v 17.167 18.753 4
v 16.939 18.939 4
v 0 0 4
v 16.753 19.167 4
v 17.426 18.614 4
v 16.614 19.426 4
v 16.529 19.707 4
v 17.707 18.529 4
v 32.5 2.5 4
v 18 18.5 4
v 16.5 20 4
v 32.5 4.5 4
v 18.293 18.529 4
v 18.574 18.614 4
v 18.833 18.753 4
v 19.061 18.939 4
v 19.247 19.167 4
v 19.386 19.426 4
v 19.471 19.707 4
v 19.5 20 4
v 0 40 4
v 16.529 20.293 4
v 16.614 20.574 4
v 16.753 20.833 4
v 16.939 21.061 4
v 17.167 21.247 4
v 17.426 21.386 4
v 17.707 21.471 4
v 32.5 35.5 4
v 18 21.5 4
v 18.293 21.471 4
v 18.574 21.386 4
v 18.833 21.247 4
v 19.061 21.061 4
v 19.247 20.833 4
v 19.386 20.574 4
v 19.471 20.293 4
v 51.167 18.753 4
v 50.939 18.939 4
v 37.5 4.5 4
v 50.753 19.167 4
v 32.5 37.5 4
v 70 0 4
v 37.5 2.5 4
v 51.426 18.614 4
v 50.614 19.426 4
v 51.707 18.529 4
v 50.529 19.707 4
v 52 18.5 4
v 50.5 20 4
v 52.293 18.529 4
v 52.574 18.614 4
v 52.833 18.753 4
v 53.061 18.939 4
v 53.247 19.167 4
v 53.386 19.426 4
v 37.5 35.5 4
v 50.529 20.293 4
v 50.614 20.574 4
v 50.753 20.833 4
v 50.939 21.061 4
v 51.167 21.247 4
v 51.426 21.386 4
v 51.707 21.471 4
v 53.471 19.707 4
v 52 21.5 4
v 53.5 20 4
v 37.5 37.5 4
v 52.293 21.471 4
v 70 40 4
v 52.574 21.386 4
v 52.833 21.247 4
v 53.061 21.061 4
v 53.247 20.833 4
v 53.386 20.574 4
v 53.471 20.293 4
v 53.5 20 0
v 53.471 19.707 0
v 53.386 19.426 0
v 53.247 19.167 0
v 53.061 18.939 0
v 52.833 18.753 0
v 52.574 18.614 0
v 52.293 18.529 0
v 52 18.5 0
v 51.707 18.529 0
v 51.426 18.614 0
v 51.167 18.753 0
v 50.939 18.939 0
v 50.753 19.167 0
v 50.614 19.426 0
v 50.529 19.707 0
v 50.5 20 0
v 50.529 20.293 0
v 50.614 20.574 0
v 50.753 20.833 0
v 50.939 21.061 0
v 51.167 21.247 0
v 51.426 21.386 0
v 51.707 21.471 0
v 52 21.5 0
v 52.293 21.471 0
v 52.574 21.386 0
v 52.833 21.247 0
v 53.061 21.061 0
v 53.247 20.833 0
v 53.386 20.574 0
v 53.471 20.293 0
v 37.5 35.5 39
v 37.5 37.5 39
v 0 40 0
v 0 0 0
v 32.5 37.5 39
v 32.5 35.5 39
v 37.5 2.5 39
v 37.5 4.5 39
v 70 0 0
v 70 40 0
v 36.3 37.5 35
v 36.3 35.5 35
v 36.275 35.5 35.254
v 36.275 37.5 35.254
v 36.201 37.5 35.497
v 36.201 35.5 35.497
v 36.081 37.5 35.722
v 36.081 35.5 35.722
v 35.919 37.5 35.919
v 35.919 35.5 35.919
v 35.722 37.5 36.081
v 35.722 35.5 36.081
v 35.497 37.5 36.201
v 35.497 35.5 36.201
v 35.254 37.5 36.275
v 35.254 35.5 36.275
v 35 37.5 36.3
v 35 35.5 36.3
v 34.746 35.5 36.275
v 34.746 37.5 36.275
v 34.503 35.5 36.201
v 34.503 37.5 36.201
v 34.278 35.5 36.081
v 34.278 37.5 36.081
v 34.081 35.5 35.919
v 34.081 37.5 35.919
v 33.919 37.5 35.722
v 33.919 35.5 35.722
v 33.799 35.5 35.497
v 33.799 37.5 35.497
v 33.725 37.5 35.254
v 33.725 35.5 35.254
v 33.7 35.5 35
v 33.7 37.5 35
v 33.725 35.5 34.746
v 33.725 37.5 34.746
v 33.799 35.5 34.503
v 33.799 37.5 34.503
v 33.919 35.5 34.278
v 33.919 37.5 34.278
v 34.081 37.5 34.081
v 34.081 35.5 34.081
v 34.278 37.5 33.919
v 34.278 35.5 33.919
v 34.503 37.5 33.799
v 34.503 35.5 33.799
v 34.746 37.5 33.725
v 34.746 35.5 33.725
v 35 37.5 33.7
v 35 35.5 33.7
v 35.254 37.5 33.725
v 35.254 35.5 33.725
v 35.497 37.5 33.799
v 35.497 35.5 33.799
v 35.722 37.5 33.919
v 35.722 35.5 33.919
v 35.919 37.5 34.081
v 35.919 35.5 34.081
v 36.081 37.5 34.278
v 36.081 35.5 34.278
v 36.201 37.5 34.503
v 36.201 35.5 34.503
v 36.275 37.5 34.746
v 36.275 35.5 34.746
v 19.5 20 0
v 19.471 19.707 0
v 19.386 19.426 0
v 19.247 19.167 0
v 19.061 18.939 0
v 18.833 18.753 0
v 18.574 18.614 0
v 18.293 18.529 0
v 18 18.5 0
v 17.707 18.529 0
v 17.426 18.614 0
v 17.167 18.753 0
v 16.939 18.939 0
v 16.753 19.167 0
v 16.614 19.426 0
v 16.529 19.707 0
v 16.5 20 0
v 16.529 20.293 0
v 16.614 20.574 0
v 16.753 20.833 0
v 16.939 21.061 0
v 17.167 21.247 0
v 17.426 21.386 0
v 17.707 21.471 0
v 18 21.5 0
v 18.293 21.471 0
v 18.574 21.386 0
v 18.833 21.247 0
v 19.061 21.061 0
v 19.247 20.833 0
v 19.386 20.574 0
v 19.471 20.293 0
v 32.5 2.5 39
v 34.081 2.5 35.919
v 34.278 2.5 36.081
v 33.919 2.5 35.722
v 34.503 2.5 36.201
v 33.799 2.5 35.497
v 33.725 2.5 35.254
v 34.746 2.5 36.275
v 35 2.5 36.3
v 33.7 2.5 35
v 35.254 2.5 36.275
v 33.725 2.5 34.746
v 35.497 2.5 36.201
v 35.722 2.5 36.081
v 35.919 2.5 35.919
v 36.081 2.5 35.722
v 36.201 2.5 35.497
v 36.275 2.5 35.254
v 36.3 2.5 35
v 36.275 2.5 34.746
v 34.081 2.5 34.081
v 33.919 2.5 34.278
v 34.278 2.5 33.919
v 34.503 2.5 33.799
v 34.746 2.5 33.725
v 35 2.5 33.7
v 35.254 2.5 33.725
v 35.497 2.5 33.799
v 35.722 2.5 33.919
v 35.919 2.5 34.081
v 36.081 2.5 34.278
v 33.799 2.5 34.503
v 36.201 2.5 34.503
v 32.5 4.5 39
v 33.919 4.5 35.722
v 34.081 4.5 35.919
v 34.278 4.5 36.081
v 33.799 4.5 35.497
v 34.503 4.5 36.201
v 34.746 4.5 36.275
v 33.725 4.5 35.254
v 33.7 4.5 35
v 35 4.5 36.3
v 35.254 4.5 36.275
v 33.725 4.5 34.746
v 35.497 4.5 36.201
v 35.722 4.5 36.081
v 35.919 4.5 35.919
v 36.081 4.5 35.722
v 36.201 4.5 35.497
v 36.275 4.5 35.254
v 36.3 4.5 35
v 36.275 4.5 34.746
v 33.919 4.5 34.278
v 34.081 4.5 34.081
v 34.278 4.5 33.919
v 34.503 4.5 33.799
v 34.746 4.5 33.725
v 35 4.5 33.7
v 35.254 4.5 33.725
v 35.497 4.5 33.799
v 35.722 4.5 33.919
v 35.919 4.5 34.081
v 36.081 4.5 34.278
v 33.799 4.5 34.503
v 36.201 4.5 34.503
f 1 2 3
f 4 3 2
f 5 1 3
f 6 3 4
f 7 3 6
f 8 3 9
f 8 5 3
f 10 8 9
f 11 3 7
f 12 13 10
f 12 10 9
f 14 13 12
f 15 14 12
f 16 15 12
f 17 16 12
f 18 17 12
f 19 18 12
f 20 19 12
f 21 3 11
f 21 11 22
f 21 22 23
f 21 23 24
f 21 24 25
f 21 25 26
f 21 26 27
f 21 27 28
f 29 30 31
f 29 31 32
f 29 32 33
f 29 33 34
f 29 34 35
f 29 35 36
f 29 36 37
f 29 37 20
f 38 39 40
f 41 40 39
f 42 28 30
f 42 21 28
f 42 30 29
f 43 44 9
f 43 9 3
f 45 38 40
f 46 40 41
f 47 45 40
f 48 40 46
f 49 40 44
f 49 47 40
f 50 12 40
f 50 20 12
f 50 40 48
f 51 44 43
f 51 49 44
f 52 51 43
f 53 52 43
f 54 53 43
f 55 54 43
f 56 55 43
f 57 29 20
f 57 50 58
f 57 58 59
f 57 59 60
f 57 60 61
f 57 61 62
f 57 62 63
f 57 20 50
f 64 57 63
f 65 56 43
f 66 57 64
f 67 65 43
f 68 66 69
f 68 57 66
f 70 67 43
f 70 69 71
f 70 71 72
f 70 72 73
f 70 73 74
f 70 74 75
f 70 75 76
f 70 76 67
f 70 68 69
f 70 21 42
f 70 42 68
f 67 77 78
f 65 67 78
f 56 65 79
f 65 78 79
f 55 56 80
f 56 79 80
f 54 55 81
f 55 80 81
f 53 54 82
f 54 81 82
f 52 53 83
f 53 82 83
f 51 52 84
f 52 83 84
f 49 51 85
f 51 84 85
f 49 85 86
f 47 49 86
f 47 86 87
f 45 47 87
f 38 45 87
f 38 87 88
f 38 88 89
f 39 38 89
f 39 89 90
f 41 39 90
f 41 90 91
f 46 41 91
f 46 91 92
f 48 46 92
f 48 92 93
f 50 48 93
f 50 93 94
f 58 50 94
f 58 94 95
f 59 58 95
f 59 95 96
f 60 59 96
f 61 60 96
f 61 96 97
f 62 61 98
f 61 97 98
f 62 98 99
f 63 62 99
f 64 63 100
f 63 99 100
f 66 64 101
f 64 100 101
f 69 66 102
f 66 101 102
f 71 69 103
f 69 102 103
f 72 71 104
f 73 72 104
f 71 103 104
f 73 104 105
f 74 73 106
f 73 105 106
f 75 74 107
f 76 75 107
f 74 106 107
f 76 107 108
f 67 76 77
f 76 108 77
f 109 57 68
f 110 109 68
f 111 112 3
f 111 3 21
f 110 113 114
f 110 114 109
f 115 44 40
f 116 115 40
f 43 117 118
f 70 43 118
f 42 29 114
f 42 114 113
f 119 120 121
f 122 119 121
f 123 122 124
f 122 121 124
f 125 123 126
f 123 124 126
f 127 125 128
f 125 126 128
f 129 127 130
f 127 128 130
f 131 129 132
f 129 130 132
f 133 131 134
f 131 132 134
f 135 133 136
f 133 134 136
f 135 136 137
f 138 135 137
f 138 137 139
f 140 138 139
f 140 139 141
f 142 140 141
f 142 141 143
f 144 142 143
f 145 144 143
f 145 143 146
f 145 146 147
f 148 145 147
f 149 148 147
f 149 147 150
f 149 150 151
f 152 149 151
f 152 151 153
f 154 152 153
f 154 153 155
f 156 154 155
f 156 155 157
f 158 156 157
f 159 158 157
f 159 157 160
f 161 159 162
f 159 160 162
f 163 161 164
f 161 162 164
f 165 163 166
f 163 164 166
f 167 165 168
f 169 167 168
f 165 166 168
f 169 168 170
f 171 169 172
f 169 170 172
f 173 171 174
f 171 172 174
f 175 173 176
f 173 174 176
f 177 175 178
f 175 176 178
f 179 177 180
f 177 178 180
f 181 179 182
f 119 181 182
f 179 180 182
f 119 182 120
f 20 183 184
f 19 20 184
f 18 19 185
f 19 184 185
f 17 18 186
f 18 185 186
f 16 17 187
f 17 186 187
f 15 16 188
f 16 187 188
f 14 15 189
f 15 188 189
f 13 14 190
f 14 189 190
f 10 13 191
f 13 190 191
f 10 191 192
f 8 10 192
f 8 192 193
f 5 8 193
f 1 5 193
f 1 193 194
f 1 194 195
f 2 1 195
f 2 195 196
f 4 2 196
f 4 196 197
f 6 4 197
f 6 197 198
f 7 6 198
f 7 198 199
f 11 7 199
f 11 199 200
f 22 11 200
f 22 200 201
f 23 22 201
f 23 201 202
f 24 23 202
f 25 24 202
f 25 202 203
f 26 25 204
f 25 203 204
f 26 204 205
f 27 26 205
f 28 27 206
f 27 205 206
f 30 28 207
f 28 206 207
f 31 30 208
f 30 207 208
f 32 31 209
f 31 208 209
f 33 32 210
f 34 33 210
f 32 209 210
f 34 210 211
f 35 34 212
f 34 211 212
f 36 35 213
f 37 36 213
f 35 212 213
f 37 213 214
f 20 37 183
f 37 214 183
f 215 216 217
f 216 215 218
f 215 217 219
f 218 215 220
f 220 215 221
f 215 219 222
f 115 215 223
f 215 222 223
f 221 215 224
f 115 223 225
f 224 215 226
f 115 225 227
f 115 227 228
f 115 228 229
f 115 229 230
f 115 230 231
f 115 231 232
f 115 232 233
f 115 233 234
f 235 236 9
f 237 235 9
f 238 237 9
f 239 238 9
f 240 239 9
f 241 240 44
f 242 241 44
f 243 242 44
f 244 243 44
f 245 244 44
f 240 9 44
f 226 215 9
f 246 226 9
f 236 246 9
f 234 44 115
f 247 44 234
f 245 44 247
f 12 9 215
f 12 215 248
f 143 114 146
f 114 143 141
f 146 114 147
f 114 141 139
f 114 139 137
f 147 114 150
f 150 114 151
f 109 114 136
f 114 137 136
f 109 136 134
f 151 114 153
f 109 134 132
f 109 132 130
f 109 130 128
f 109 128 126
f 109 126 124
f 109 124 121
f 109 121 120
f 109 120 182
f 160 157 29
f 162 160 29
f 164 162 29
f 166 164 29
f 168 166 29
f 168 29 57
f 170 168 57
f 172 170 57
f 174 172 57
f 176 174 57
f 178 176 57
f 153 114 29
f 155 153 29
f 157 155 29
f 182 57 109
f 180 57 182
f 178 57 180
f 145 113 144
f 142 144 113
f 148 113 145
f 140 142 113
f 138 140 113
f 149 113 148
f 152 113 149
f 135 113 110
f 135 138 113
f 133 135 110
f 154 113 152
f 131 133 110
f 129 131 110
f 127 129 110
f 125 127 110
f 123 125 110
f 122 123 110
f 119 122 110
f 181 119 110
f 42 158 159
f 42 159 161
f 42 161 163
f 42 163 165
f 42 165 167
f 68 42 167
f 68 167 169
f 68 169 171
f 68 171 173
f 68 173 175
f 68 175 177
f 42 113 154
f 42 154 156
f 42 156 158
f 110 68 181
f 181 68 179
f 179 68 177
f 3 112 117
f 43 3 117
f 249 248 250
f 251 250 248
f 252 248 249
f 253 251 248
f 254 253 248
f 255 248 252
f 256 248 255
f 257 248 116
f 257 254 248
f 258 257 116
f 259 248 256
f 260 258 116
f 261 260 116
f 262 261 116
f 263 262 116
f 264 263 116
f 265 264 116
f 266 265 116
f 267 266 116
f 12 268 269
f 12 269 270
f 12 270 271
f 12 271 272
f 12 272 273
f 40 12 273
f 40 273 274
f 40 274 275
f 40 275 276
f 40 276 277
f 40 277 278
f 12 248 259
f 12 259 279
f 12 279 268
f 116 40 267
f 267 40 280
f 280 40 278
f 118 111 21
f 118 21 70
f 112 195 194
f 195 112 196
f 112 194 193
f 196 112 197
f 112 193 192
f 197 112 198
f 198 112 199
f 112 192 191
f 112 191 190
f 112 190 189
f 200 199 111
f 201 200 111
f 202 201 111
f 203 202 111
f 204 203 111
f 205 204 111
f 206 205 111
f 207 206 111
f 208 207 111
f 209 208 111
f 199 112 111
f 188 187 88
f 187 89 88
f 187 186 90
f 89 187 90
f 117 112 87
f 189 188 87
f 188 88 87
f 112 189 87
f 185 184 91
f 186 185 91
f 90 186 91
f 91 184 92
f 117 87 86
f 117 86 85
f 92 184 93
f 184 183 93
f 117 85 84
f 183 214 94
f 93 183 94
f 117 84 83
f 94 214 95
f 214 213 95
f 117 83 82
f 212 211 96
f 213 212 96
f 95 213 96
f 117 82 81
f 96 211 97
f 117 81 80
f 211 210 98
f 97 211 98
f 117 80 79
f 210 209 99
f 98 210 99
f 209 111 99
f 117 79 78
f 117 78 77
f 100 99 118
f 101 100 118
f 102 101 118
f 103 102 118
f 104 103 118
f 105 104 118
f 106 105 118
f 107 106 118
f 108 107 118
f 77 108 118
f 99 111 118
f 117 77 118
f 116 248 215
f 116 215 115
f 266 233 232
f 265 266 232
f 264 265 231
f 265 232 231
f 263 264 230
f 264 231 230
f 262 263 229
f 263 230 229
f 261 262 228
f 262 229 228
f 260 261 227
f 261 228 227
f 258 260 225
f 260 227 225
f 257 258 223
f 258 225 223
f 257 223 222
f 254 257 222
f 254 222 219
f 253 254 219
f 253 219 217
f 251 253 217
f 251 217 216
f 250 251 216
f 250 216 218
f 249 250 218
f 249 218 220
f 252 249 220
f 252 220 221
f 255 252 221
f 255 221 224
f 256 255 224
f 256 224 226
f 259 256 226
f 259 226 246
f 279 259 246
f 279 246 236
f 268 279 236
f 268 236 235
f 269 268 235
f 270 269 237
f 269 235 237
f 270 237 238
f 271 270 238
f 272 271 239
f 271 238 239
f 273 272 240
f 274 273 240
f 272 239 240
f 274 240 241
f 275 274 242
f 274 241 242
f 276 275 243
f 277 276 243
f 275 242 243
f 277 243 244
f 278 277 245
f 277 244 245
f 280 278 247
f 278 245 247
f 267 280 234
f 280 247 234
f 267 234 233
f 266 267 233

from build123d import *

# Parameters (mm, degrees)
SKETCH_W        = 70
SKETCH_H        = 40
PAD_DEPTH       = 4
SKETCH001_W     = 5
SKETCH001_H     = 2
PAD001_DEPTH    = 35
SKETCH002_R     = 1.3
POCKET_DEPTH    = 37
SKETCH003_R     = 1.5
POCKET001_DEPTH = 5


with BuildPart() as part:
    # Sketch → Pad (new body)
    with BuildSketch(Plane.XY):
        with Locations((35, 20)):
            Rectangle(SKETCH_W, SKETCH_H)
    extrude(amount=PAD_DEPTH)

    # Sketch001 (on Face6 of Pad) → Pad001 (join)
    with BuildSketch(Plane.XY.offset(4)):
        with Locations((35, 36.5)):
            Rectangle(SKETCH001_W, SKETCH001_H)
        with Locations((35, 3.5)):
            Rectangle(SKETCH001_W, SKETCH001_H)
    extrude(amount=PAD001_DEPTH)

    # Sketch002 (on Face8 of Pad001) → Pocket (cut)
    with BuildSketch(Plane.XZ.offset(-2.5)):
        with Locations((35, 35)):
            Circle(SKETCH002_R)
    extrude(amount=-POCKET_DEPTH, mode=Mode.SUBTRACT)

    # Sketch003 (on Face4 of Pocket) → Pocket001 (cut)
    with BuildSketch(Plane(origin=(0, 0, 0), x_dir=(1, 0, 0), z_dir=(0, 0, -1))):
        with Locations((18, -20)):
            Circle(SKETCH003_R)
        with Locations((52, -20)):
            Circle(SKETCH003_R)
    extrude(amount=-POCKET001_DEPTH, mode=Mode.SUBTRACT)


solid = part.part
